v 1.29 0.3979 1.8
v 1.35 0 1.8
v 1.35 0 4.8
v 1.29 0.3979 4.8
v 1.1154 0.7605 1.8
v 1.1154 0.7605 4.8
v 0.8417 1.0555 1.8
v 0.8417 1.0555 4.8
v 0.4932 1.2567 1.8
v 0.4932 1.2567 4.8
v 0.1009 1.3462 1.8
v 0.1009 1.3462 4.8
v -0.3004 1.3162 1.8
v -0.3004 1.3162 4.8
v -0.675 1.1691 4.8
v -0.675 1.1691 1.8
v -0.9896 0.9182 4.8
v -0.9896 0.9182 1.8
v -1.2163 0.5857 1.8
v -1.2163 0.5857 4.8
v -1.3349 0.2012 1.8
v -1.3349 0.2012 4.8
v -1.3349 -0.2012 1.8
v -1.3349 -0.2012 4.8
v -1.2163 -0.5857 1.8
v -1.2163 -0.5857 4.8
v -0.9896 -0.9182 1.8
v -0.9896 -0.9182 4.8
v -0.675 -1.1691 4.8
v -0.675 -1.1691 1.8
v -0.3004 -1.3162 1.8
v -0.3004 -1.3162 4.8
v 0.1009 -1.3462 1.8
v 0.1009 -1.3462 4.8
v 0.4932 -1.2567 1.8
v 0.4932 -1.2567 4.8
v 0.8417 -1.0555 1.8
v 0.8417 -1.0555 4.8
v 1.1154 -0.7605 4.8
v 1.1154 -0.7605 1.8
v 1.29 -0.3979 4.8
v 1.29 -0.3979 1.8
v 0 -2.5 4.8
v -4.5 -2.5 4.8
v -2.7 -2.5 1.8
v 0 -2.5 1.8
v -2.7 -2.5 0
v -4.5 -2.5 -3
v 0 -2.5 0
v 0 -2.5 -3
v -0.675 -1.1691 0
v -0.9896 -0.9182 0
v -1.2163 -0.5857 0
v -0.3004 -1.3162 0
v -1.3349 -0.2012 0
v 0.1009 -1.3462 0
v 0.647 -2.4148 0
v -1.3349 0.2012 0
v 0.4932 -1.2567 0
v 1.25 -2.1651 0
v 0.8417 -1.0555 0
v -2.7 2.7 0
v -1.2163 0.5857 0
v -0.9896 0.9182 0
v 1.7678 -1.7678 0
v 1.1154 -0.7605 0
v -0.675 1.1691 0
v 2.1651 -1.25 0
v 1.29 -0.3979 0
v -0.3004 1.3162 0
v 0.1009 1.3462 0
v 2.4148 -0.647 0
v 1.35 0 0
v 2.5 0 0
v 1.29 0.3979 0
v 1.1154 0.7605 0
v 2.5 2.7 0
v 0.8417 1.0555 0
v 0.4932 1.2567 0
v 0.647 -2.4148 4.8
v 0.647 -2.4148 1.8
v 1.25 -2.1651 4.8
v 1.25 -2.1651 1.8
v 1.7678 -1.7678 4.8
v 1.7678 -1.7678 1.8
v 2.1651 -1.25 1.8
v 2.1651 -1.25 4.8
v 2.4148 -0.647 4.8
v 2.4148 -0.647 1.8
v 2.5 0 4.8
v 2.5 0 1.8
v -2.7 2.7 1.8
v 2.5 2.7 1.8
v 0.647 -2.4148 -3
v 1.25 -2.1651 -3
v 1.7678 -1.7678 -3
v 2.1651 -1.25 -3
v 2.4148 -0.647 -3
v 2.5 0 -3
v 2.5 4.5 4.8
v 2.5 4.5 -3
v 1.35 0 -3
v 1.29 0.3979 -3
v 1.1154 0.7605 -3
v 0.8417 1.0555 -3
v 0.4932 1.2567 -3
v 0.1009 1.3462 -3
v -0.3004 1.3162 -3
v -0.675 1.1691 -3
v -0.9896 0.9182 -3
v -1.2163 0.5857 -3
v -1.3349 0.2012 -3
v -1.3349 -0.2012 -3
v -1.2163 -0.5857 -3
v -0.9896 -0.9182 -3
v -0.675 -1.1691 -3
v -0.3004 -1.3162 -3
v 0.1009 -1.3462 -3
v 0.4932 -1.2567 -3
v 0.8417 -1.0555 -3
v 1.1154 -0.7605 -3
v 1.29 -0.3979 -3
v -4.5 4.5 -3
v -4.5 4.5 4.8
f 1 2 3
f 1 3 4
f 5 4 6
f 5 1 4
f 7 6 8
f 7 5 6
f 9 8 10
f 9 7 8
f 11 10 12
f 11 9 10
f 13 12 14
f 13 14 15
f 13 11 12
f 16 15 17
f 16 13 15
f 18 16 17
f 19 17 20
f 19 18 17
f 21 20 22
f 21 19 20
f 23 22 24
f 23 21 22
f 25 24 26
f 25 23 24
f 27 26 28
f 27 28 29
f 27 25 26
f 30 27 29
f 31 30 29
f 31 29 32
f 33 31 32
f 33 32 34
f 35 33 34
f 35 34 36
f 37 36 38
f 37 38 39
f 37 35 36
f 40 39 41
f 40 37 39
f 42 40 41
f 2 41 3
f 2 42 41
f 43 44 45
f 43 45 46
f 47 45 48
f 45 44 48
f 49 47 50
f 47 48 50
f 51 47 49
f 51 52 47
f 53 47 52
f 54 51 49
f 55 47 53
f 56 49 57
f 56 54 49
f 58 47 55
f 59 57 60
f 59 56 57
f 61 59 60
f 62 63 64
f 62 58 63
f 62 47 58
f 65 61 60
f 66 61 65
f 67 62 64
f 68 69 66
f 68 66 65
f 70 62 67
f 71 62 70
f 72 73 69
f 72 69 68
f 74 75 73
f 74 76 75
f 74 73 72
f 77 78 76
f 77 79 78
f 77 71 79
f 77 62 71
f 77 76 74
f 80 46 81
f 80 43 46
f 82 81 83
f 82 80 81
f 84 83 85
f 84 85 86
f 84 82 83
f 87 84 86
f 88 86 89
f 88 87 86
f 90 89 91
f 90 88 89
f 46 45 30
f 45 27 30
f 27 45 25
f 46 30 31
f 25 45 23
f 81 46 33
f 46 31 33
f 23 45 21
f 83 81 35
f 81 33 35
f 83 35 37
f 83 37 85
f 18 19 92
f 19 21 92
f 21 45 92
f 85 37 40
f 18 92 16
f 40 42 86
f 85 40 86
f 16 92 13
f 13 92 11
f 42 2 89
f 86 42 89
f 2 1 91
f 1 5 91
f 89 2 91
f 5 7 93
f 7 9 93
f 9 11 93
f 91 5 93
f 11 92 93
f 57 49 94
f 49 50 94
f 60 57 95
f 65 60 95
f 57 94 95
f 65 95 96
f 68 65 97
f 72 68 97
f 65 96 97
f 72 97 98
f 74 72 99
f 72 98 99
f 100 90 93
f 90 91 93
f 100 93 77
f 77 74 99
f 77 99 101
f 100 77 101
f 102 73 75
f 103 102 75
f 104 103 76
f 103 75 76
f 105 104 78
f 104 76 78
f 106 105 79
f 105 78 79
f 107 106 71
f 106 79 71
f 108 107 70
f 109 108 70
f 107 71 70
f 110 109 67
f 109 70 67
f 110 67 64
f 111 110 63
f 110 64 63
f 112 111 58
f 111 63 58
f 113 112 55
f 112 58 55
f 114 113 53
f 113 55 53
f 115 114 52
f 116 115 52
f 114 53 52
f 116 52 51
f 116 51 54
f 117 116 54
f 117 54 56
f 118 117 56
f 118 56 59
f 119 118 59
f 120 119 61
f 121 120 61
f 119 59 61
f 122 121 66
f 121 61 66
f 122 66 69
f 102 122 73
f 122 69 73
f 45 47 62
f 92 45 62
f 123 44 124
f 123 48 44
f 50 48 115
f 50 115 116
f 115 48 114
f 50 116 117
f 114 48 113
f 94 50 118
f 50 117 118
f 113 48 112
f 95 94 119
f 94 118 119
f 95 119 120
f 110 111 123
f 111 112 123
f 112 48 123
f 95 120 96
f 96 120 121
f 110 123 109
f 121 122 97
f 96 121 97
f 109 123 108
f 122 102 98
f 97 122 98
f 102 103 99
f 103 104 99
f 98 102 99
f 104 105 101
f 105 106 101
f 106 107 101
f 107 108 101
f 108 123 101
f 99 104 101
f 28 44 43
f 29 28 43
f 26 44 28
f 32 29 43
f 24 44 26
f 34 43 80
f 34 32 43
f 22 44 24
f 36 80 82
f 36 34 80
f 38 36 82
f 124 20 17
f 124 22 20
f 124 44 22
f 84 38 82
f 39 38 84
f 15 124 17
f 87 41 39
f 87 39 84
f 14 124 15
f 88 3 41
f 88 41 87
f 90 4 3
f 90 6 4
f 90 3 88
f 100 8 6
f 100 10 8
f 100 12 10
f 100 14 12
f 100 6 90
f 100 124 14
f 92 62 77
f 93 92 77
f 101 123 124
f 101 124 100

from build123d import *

# Parameters (mm, degrees)
F0_W     = 5.2
F0_H     = 1.8
F0_H_2   = 5.2
F0_R     = 1.35
F1_DEPTH = 3
F2_W     = 5.2
F2_H     = 1.8
F3_DEPTH = 1.8
F4_W     = 7
F4_H     = 7
F4_R     = 1.35
F5_DEPTH = 3
F6_R     = 2.5


with BuildPart() as f1:
    # F0 (on Top) → F1 (new body)
    with BuildSketch(Plane.XY):
        with Locations((-0.1, 3.6)):
            Rectangle(F0_W, F0_H)
        Polygon((-4.5, -2.5), (-2.7, -2.5), (-2.7, 2.7), (-2.7, 4.5), (-4.5, 4.5), align=None)
        with Locations((-0.1, 0.1)):
            Rectangle(F0_W, F0_H_2)
        Circle(F0_R, mode=Mode.SUBTRACT)
    extrude(amount=-F1_DEPTH)

    # F0 (on Top) + F2 (on face) → F3 (join)
    with BuildSketch(Plane.XY):
        Polygon((-4.5, -2.5), (-2.7, -2.5), (-2.7, 2.7), (-2.7, 4.5), (-4.5, 4.5), align=None)
    with BuildSketch(Plane.XY):
        with Locations((-0.1, 3.6)):
            Rectangle(F2_W, F2_H)
    extrude(amount=F3_DEPTH)

    # F4 (on face) → F5 (join)
    with BuildSketch(Plane.XY.offset(1.8)):
        with Locations((-1, 1)):
            Rectangle(F4_W, F4_H)
        Circle(F4_R, mode=Mode.SUBTRACT)
    extrude(amount=F5_DEPTH)

    # F6
    f6_edges = [f1.edges().sort_by_distance(p)[0] for p in [
        (2.5, -2.5, 3.3),
        (2.5, -2.5, -1.5),
    ]]
    fillet(f6_edges, radius=F6_R)


solid = f1.part
